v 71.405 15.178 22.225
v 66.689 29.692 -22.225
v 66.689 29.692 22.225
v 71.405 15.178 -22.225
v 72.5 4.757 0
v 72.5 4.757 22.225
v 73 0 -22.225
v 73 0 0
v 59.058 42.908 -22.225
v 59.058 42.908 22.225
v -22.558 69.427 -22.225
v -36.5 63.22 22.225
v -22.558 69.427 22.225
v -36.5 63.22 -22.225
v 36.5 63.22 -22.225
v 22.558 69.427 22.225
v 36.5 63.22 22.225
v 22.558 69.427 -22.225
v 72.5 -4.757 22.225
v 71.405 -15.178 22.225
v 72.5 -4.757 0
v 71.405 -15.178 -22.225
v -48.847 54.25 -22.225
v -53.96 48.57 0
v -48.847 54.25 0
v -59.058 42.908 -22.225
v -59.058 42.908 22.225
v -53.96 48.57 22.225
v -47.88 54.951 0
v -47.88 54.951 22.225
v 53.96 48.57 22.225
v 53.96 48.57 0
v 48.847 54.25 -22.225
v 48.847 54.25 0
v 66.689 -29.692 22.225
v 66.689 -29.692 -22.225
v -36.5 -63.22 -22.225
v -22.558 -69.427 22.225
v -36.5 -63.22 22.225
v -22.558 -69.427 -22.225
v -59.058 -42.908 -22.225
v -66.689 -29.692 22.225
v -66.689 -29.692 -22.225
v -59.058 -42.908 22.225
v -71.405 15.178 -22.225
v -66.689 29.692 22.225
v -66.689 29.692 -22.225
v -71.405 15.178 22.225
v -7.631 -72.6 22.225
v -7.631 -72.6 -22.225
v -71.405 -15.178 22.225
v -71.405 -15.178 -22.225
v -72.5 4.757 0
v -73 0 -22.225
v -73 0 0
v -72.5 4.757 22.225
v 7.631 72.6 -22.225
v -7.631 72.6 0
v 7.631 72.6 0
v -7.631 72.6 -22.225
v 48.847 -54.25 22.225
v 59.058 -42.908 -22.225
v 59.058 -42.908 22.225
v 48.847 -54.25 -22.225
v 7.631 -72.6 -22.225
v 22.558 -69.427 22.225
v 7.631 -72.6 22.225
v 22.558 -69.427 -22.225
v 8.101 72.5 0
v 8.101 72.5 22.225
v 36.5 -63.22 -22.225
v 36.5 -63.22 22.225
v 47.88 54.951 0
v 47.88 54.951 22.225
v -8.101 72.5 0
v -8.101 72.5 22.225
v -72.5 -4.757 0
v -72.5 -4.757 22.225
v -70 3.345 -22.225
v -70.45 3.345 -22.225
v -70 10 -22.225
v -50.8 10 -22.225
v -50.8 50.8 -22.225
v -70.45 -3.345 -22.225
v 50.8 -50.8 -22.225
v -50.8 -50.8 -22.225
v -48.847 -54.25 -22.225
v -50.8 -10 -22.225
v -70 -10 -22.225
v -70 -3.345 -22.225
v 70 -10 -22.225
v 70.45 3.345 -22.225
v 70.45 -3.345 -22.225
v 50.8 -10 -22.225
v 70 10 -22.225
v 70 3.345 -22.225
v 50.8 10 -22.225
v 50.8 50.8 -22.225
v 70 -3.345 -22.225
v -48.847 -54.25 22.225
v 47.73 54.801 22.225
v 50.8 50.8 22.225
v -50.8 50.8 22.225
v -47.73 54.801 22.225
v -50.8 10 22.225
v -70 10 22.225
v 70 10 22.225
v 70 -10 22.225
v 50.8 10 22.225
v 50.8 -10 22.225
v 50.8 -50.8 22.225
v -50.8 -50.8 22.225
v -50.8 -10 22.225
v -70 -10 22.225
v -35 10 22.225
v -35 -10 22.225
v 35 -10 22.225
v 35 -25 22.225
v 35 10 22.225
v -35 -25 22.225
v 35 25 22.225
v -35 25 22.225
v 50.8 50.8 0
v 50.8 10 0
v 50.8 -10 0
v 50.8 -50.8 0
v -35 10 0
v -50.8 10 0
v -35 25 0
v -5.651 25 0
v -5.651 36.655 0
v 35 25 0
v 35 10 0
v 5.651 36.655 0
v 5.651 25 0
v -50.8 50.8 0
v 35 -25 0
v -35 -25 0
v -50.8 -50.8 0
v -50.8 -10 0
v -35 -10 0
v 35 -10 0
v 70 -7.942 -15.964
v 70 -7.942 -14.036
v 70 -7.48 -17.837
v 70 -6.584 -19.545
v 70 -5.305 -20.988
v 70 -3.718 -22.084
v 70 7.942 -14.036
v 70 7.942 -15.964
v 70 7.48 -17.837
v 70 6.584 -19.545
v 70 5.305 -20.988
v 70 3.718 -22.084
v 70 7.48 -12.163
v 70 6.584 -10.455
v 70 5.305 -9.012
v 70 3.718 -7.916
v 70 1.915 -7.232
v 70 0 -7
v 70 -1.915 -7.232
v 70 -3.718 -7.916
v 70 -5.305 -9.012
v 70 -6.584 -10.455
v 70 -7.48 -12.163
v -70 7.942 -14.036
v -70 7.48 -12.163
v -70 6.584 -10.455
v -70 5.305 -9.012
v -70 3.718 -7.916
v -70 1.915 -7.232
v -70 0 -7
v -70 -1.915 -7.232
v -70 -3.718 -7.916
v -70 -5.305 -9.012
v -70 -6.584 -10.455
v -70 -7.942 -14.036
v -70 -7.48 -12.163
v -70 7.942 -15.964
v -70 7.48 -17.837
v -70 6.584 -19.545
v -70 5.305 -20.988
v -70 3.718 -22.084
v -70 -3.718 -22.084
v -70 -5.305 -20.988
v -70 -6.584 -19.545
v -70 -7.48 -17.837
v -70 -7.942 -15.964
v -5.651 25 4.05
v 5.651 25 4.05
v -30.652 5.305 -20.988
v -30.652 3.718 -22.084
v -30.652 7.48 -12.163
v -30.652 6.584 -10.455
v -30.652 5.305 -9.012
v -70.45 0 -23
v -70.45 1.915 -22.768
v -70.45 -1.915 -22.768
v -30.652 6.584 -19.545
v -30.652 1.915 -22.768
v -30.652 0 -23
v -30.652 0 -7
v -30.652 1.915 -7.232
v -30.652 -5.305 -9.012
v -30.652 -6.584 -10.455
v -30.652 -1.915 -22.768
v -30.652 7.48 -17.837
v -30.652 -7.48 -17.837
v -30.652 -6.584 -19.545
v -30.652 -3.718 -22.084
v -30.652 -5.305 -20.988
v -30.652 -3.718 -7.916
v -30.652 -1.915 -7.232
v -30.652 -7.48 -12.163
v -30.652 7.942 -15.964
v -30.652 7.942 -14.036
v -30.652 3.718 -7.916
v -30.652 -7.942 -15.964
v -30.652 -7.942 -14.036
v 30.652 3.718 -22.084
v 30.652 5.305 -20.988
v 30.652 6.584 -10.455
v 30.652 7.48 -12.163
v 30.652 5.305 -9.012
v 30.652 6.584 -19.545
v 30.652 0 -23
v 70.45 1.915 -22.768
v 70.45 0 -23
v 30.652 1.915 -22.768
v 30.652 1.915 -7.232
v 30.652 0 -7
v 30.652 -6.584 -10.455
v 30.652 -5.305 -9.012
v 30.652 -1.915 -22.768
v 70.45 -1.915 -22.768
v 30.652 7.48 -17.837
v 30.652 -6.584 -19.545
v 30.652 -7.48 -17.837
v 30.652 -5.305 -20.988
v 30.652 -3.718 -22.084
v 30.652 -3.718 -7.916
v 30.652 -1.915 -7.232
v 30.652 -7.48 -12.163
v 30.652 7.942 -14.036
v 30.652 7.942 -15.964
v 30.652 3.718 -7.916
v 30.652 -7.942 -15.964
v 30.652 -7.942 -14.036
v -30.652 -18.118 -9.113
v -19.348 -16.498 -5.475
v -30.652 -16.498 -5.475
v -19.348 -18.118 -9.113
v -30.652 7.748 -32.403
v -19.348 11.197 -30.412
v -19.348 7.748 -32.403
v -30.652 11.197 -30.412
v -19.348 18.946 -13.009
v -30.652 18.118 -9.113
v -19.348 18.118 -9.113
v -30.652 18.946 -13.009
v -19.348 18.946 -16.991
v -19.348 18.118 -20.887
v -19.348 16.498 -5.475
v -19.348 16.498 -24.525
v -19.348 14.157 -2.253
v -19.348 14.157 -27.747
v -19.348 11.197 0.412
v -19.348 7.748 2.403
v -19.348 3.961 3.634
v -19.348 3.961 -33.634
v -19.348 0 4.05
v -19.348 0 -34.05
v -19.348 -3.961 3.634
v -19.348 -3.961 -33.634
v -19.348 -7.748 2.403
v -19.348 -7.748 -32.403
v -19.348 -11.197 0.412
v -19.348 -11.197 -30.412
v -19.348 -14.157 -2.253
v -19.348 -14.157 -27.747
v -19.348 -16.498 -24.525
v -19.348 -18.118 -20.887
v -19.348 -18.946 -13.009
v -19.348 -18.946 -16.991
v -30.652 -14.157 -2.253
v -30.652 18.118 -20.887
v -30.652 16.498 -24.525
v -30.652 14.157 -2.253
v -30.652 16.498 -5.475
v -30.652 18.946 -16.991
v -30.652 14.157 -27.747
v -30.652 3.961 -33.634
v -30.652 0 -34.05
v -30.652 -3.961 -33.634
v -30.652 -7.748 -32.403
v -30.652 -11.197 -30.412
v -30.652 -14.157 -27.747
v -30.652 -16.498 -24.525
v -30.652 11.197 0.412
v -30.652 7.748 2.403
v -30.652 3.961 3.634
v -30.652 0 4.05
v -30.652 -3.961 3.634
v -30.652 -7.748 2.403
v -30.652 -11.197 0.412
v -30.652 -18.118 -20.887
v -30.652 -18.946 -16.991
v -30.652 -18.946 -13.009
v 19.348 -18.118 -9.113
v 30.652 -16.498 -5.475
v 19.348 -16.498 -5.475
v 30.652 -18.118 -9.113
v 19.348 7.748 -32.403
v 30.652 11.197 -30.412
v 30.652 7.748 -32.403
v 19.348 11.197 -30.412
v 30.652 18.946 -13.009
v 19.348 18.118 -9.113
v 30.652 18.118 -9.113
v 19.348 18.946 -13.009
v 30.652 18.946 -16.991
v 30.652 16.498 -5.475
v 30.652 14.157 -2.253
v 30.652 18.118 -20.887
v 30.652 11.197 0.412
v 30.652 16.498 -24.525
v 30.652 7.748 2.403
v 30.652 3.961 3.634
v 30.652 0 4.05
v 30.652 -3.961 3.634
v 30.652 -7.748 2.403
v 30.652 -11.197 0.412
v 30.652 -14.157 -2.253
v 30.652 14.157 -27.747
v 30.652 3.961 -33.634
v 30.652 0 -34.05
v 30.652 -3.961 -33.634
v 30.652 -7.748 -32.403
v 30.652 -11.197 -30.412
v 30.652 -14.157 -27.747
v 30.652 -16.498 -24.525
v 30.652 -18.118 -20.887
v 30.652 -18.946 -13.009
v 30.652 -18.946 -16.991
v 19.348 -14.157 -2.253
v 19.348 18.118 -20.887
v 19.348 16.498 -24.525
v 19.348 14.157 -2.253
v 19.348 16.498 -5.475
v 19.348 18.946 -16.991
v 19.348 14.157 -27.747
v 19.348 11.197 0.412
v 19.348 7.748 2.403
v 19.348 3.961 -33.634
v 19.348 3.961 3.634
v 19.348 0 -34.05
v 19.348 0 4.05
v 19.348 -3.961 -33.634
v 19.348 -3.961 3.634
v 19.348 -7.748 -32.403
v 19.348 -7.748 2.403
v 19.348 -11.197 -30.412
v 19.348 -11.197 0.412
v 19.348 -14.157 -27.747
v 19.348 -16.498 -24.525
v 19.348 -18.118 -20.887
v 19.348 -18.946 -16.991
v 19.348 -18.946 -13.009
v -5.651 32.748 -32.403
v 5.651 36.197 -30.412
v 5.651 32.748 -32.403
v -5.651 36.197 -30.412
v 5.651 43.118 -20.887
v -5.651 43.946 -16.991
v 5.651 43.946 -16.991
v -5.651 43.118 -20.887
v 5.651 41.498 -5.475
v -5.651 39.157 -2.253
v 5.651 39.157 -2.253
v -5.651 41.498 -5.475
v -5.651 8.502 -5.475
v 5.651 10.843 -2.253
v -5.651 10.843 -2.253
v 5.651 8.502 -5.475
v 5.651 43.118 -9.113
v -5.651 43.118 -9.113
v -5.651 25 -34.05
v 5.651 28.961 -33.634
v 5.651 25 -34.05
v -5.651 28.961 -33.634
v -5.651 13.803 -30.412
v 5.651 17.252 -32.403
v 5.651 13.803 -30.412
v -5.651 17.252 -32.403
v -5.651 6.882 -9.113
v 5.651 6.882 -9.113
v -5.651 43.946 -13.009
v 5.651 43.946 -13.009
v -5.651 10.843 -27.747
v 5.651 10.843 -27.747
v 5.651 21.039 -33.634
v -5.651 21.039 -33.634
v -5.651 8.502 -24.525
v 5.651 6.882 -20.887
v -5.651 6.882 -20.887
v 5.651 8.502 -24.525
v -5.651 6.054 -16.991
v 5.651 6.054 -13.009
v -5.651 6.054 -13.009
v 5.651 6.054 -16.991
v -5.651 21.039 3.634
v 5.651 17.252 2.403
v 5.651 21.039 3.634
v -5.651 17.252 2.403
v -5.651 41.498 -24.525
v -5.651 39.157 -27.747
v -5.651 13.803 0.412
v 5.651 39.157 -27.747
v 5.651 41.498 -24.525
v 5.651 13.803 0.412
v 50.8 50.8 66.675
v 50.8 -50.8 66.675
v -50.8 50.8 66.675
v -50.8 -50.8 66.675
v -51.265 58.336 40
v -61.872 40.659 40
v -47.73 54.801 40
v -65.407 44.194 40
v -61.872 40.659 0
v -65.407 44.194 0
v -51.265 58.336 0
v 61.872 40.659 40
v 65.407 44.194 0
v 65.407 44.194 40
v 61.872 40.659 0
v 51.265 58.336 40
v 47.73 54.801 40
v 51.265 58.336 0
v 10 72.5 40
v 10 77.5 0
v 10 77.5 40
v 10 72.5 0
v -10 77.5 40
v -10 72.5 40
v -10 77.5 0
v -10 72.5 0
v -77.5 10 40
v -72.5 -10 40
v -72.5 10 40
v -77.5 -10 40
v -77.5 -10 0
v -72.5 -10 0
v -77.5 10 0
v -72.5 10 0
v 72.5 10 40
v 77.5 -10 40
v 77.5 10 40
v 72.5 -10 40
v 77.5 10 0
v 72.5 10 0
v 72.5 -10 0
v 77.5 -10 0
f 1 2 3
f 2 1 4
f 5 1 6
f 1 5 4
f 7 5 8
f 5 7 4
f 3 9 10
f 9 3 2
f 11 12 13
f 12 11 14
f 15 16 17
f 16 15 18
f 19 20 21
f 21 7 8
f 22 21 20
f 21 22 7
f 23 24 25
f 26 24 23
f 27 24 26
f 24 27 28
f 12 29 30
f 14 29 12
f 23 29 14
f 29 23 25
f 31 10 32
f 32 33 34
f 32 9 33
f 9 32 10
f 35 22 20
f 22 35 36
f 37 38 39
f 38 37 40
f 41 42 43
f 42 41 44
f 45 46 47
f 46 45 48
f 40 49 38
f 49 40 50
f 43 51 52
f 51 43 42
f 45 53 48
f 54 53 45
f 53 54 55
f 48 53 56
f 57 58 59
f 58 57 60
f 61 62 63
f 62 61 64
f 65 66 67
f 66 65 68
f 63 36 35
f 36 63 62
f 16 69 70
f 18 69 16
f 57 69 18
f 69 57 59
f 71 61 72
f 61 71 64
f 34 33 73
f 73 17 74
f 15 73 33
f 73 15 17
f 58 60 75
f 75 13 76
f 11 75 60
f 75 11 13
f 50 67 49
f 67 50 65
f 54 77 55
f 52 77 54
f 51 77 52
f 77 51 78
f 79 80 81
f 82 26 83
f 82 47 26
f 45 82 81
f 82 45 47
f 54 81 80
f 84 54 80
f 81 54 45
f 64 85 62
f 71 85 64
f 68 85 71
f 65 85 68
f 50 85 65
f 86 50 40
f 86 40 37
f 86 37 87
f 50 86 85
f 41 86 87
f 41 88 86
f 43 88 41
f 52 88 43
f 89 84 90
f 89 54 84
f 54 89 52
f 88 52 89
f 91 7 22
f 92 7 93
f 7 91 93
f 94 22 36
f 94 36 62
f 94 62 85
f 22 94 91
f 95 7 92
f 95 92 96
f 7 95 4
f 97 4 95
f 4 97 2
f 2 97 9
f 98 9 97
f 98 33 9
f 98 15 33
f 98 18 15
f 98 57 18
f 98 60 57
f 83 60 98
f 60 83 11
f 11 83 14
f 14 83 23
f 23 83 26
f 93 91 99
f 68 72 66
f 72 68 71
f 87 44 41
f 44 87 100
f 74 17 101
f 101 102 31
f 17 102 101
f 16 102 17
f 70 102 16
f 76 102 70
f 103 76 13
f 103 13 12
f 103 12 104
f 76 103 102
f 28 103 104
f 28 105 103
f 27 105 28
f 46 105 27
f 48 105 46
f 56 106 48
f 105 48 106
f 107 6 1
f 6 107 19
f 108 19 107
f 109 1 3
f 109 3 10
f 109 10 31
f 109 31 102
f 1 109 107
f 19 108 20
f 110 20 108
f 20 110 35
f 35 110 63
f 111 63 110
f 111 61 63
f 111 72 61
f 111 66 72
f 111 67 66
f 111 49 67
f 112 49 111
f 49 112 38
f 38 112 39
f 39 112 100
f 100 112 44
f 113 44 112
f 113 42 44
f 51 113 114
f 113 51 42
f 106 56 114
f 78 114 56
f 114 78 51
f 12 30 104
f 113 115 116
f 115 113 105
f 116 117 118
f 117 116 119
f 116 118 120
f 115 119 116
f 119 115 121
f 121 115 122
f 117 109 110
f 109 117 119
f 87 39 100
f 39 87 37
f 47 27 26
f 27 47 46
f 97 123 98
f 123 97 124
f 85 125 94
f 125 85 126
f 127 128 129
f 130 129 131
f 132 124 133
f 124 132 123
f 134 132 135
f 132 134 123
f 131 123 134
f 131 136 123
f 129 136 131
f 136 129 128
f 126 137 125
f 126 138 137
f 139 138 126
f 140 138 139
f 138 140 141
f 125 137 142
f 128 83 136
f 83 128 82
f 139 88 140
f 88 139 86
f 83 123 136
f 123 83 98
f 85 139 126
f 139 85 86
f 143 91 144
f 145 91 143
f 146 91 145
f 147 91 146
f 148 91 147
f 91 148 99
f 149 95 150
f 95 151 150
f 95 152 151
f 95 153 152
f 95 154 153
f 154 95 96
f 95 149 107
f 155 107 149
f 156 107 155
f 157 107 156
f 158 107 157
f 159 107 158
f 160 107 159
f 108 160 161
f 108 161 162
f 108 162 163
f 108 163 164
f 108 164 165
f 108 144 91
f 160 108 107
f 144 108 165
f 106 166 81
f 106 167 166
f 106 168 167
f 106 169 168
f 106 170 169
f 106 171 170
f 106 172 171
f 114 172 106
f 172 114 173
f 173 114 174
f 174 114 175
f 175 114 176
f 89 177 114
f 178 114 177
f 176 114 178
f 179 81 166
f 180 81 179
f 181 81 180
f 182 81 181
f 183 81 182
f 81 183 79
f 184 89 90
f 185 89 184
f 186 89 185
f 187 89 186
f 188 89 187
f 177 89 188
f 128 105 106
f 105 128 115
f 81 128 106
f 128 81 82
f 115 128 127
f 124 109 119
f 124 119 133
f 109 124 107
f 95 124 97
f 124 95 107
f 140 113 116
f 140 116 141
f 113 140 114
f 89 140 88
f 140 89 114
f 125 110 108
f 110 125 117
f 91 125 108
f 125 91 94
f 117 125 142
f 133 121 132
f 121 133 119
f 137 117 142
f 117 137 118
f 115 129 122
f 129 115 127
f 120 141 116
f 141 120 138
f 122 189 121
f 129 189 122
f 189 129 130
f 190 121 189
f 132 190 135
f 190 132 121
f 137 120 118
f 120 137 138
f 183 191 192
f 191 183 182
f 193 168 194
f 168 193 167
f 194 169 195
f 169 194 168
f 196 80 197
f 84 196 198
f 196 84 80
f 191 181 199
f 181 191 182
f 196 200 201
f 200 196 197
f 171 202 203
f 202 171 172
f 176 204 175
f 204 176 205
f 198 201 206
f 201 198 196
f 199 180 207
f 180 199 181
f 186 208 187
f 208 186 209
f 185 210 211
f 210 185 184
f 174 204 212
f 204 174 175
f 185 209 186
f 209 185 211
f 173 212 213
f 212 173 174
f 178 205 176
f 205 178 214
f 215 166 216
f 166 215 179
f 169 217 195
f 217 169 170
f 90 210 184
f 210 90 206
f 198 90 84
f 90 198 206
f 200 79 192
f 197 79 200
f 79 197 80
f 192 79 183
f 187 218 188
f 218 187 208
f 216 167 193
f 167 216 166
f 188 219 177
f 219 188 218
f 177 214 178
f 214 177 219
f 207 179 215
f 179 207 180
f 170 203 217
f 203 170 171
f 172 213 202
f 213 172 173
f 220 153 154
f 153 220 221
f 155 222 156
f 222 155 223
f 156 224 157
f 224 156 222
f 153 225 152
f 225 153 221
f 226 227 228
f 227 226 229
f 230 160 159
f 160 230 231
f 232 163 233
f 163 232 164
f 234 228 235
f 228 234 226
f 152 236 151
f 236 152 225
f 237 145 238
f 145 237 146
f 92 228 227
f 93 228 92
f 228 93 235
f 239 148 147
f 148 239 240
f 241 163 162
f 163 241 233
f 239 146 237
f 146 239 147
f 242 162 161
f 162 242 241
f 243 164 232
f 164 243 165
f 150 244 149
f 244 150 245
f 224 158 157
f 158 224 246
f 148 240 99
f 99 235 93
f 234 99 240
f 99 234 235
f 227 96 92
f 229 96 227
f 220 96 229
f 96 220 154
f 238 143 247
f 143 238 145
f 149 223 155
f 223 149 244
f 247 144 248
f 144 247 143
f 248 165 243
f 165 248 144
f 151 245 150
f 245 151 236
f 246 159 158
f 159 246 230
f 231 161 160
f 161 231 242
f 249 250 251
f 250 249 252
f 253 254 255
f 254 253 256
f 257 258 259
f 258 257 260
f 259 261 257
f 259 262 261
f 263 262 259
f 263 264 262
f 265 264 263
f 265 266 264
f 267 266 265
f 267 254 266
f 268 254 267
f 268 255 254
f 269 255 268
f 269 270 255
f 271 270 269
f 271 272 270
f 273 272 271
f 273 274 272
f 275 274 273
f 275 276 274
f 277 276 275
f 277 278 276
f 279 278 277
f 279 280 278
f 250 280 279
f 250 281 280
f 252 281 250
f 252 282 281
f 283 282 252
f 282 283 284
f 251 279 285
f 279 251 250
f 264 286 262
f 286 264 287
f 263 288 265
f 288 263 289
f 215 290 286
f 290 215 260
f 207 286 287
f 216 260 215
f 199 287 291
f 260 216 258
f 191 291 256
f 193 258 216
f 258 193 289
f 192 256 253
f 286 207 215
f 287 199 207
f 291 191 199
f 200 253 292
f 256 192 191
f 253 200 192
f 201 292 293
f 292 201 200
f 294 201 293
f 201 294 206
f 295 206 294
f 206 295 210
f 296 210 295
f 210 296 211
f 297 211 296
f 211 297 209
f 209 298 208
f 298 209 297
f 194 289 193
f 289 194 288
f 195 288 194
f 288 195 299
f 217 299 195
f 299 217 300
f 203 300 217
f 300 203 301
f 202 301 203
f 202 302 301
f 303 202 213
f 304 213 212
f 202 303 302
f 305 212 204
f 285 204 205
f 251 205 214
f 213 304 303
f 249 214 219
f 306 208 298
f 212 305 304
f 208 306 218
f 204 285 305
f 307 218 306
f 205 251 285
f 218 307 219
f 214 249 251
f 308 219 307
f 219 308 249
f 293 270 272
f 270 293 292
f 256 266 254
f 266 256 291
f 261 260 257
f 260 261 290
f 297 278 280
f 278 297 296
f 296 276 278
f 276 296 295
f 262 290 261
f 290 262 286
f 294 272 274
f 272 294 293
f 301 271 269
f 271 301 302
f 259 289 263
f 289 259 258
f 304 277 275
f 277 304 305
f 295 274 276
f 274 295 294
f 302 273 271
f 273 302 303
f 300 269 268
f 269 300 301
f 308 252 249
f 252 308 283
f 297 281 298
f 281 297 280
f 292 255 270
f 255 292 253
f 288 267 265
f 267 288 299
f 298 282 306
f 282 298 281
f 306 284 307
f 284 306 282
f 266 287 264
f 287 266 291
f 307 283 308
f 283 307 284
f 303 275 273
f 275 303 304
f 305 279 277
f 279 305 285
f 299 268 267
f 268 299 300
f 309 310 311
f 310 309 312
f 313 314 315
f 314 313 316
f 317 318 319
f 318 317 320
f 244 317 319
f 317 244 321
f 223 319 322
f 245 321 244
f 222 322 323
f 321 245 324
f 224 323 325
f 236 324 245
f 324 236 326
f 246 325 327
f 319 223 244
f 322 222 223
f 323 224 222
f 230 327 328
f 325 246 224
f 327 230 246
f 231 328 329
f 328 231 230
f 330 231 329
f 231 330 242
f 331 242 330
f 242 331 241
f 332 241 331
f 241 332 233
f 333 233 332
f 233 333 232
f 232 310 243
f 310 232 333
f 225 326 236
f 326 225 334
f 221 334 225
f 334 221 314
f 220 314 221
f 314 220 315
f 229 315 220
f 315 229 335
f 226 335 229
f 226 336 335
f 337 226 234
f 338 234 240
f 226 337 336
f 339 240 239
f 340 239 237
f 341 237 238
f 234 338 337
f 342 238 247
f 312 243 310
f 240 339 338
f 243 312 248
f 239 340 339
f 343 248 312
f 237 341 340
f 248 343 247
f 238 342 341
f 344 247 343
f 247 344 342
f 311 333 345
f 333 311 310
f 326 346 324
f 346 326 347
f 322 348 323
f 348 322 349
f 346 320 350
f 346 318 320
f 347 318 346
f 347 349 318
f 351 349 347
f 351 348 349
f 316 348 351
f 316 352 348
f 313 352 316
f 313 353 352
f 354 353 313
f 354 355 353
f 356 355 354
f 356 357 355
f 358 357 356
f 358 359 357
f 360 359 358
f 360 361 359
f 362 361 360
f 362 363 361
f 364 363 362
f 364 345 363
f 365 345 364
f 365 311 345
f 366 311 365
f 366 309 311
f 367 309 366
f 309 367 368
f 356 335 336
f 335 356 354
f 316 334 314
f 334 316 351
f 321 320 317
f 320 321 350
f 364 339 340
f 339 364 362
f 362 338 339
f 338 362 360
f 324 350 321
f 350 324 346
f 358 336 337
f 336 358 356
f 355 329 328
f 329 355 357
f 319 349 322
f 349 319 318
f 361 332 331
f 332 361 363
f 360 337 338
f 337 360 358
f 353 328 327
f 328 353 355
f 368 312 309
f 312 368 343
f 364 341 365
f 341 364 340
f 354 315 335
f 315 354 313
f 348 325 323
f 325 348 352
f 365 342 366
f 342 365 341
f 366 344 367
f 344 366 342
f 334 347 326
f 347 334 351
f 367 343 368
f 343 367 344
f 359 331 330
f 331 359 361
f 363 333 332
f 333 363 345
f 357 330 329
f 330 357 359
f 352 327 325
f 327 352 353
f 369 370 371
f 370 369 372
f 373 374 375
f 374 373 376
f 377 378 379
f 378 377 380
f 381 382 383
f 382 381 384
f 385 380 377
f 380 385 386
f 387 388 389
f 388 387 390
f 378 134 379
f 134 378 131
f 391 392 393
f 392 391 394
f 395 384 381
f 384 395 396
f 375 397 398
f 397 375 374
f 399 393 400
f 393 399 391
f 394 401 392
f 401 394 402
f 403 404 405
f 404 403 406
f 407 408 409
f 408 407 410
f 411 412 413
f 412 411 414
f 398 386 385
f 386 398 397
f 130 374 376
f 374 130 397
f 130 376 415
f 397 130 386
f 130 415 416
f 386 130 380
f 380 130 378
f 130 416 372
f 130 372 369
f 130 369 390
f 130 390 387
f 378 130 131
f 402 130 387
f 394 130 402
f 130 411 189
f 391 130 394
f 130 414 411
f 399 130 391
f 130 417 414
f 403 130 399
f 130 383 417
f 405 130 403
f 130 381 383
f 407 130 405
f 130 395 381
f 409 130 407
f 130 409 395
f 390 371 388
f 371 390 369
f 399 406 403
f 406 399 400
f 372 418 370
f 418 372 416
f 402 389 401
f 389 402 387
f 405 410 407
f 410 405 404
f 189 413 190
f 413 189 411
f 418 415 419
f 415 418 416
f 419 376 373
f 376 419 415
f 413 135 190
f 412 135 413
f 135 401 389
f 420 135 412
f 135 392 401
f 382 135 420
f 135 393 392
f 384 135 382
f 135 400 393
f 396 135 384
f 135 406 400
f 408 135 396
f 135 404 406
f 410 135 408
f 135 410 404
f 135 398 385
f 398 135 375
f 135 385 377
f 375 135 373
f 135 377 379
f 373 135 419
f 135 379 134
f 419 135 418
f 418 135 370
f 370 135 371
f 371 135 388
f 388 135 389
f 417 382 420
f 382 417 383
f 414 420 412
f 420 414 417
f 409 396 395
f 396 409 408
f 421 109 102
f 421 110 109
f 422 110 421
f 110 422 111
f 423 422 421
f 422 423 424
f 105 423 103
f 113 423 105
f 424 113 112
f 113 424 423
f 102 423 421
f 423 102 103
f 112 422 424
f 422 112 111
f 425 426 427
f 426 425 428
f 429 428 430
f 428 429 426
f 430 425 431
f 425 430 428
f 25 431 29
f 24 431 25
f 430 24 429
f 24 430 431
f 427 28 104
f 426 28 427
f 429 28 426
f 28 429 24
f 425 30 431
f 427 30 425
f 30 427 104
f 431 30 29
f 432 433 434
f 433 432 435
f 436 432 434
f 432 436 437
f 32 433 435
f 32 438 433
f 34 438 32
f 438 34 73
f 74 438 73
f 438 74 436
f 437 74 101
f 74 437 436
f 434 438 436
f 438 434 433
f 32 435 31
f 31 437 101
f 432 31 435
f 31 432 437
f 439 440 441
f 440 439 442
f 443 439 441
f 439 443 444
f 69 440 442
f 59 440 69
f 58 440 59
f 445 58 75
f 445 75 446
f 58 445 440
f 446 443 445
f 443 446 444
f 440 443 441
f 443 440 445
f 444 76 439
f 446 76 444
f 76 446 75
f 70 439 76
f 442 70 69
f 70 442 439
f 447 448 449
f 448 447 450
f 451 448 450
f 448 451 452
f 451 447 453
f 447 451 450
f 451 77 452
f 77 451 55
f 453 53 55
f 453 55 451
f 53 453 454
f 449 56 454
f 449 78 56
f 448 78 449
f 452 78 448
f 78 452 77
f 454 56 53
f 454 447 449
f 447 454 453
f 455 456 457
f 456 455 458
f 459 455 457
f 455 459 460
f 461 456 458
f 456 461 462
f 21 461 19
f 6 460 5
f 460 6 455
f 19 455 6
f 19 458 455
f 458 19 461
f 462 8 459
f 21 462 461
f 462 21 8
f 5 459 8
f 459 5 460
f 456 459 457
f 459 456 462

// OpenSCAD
//main body
difference(){
    
    cylinder(44.45,73,73,true);
    // square hole in middle
    translate([0,0,-22.225])
        cube([101.6,101.6,44.45], true);
    //square extension
    cube([140,20,45], true);
    //another hole in the middle
    cube([70,50,45], true);
    /*hole 1 in corner
    translate([-38, -38, 0])
        cylinder(500, 12, 12, true);
    //hole 2 in corner
    translate([-38, 38, 0])
        cylinder(500, 12, 12, true);
    //hole 3 in corner
    translate([38, -38, 0])
        cylinder(500, 12, 12, true);
    //hole 4 in corner
    translate([38, 38, 0])
        cylinder(500, 12, 12, true);*/
}
//main motor left
rotate([0,90,0])
    translate([15, 0, -50])
cylinder(40.9, 8, 8, true);
//main motor right
rotate([0,90,0])
    translate([15, 0, 50])
cylinder(40.9, 8, 8, true);
/*motor turnything left
rotate([90,0,0])
    translate([0,-75, -185]) 
    cylinder(40, 10, 10, $fn=6, true);
//motor turnything right
rotate([90,0,0])
    translate([0,-75, 185]) 
    cylinder(40, 10, 10, $fn=6, true);*/
//wheel left
rotate([0, 90, 0])
    translate([15, 0, -25])
    cylinder(11.303, 19.05, 19.05, true);
//wheel left
rotate([0, 90, 0])
    translate([15, 0, 25])
    cylinder(11.303, 19.05, 19.05, true);
//caster
rotate([0, 90, 0])
    translate([15, 25, 0])
    cylinder(11.303, 19.05, 19.05, true);
//controller
    translate([0,0,44.45])
        cube([101.6,101.6,44.45], true);
//ir sensor FL
rotate([0,0,45])
translate([-5, 75, 20])
    cube([20, 5, 40], true);
//ir sensor FR
rotate([0,0,-45])
translate([5, 75, 20])
    cube([20, 5, 40], true);
//ir sensor F
translate([0, 75, 20])
    cube([20, 5, 40], true);
//ir sensor L
rotate([0, 0, 90])
    translate([0, 75, 20])
        cube([20, 5, 40], true);
//ir sensor R
rotate([0, 0, 90])
    translate([0, -75, 20])
        cube([20, 5, 40], true);
